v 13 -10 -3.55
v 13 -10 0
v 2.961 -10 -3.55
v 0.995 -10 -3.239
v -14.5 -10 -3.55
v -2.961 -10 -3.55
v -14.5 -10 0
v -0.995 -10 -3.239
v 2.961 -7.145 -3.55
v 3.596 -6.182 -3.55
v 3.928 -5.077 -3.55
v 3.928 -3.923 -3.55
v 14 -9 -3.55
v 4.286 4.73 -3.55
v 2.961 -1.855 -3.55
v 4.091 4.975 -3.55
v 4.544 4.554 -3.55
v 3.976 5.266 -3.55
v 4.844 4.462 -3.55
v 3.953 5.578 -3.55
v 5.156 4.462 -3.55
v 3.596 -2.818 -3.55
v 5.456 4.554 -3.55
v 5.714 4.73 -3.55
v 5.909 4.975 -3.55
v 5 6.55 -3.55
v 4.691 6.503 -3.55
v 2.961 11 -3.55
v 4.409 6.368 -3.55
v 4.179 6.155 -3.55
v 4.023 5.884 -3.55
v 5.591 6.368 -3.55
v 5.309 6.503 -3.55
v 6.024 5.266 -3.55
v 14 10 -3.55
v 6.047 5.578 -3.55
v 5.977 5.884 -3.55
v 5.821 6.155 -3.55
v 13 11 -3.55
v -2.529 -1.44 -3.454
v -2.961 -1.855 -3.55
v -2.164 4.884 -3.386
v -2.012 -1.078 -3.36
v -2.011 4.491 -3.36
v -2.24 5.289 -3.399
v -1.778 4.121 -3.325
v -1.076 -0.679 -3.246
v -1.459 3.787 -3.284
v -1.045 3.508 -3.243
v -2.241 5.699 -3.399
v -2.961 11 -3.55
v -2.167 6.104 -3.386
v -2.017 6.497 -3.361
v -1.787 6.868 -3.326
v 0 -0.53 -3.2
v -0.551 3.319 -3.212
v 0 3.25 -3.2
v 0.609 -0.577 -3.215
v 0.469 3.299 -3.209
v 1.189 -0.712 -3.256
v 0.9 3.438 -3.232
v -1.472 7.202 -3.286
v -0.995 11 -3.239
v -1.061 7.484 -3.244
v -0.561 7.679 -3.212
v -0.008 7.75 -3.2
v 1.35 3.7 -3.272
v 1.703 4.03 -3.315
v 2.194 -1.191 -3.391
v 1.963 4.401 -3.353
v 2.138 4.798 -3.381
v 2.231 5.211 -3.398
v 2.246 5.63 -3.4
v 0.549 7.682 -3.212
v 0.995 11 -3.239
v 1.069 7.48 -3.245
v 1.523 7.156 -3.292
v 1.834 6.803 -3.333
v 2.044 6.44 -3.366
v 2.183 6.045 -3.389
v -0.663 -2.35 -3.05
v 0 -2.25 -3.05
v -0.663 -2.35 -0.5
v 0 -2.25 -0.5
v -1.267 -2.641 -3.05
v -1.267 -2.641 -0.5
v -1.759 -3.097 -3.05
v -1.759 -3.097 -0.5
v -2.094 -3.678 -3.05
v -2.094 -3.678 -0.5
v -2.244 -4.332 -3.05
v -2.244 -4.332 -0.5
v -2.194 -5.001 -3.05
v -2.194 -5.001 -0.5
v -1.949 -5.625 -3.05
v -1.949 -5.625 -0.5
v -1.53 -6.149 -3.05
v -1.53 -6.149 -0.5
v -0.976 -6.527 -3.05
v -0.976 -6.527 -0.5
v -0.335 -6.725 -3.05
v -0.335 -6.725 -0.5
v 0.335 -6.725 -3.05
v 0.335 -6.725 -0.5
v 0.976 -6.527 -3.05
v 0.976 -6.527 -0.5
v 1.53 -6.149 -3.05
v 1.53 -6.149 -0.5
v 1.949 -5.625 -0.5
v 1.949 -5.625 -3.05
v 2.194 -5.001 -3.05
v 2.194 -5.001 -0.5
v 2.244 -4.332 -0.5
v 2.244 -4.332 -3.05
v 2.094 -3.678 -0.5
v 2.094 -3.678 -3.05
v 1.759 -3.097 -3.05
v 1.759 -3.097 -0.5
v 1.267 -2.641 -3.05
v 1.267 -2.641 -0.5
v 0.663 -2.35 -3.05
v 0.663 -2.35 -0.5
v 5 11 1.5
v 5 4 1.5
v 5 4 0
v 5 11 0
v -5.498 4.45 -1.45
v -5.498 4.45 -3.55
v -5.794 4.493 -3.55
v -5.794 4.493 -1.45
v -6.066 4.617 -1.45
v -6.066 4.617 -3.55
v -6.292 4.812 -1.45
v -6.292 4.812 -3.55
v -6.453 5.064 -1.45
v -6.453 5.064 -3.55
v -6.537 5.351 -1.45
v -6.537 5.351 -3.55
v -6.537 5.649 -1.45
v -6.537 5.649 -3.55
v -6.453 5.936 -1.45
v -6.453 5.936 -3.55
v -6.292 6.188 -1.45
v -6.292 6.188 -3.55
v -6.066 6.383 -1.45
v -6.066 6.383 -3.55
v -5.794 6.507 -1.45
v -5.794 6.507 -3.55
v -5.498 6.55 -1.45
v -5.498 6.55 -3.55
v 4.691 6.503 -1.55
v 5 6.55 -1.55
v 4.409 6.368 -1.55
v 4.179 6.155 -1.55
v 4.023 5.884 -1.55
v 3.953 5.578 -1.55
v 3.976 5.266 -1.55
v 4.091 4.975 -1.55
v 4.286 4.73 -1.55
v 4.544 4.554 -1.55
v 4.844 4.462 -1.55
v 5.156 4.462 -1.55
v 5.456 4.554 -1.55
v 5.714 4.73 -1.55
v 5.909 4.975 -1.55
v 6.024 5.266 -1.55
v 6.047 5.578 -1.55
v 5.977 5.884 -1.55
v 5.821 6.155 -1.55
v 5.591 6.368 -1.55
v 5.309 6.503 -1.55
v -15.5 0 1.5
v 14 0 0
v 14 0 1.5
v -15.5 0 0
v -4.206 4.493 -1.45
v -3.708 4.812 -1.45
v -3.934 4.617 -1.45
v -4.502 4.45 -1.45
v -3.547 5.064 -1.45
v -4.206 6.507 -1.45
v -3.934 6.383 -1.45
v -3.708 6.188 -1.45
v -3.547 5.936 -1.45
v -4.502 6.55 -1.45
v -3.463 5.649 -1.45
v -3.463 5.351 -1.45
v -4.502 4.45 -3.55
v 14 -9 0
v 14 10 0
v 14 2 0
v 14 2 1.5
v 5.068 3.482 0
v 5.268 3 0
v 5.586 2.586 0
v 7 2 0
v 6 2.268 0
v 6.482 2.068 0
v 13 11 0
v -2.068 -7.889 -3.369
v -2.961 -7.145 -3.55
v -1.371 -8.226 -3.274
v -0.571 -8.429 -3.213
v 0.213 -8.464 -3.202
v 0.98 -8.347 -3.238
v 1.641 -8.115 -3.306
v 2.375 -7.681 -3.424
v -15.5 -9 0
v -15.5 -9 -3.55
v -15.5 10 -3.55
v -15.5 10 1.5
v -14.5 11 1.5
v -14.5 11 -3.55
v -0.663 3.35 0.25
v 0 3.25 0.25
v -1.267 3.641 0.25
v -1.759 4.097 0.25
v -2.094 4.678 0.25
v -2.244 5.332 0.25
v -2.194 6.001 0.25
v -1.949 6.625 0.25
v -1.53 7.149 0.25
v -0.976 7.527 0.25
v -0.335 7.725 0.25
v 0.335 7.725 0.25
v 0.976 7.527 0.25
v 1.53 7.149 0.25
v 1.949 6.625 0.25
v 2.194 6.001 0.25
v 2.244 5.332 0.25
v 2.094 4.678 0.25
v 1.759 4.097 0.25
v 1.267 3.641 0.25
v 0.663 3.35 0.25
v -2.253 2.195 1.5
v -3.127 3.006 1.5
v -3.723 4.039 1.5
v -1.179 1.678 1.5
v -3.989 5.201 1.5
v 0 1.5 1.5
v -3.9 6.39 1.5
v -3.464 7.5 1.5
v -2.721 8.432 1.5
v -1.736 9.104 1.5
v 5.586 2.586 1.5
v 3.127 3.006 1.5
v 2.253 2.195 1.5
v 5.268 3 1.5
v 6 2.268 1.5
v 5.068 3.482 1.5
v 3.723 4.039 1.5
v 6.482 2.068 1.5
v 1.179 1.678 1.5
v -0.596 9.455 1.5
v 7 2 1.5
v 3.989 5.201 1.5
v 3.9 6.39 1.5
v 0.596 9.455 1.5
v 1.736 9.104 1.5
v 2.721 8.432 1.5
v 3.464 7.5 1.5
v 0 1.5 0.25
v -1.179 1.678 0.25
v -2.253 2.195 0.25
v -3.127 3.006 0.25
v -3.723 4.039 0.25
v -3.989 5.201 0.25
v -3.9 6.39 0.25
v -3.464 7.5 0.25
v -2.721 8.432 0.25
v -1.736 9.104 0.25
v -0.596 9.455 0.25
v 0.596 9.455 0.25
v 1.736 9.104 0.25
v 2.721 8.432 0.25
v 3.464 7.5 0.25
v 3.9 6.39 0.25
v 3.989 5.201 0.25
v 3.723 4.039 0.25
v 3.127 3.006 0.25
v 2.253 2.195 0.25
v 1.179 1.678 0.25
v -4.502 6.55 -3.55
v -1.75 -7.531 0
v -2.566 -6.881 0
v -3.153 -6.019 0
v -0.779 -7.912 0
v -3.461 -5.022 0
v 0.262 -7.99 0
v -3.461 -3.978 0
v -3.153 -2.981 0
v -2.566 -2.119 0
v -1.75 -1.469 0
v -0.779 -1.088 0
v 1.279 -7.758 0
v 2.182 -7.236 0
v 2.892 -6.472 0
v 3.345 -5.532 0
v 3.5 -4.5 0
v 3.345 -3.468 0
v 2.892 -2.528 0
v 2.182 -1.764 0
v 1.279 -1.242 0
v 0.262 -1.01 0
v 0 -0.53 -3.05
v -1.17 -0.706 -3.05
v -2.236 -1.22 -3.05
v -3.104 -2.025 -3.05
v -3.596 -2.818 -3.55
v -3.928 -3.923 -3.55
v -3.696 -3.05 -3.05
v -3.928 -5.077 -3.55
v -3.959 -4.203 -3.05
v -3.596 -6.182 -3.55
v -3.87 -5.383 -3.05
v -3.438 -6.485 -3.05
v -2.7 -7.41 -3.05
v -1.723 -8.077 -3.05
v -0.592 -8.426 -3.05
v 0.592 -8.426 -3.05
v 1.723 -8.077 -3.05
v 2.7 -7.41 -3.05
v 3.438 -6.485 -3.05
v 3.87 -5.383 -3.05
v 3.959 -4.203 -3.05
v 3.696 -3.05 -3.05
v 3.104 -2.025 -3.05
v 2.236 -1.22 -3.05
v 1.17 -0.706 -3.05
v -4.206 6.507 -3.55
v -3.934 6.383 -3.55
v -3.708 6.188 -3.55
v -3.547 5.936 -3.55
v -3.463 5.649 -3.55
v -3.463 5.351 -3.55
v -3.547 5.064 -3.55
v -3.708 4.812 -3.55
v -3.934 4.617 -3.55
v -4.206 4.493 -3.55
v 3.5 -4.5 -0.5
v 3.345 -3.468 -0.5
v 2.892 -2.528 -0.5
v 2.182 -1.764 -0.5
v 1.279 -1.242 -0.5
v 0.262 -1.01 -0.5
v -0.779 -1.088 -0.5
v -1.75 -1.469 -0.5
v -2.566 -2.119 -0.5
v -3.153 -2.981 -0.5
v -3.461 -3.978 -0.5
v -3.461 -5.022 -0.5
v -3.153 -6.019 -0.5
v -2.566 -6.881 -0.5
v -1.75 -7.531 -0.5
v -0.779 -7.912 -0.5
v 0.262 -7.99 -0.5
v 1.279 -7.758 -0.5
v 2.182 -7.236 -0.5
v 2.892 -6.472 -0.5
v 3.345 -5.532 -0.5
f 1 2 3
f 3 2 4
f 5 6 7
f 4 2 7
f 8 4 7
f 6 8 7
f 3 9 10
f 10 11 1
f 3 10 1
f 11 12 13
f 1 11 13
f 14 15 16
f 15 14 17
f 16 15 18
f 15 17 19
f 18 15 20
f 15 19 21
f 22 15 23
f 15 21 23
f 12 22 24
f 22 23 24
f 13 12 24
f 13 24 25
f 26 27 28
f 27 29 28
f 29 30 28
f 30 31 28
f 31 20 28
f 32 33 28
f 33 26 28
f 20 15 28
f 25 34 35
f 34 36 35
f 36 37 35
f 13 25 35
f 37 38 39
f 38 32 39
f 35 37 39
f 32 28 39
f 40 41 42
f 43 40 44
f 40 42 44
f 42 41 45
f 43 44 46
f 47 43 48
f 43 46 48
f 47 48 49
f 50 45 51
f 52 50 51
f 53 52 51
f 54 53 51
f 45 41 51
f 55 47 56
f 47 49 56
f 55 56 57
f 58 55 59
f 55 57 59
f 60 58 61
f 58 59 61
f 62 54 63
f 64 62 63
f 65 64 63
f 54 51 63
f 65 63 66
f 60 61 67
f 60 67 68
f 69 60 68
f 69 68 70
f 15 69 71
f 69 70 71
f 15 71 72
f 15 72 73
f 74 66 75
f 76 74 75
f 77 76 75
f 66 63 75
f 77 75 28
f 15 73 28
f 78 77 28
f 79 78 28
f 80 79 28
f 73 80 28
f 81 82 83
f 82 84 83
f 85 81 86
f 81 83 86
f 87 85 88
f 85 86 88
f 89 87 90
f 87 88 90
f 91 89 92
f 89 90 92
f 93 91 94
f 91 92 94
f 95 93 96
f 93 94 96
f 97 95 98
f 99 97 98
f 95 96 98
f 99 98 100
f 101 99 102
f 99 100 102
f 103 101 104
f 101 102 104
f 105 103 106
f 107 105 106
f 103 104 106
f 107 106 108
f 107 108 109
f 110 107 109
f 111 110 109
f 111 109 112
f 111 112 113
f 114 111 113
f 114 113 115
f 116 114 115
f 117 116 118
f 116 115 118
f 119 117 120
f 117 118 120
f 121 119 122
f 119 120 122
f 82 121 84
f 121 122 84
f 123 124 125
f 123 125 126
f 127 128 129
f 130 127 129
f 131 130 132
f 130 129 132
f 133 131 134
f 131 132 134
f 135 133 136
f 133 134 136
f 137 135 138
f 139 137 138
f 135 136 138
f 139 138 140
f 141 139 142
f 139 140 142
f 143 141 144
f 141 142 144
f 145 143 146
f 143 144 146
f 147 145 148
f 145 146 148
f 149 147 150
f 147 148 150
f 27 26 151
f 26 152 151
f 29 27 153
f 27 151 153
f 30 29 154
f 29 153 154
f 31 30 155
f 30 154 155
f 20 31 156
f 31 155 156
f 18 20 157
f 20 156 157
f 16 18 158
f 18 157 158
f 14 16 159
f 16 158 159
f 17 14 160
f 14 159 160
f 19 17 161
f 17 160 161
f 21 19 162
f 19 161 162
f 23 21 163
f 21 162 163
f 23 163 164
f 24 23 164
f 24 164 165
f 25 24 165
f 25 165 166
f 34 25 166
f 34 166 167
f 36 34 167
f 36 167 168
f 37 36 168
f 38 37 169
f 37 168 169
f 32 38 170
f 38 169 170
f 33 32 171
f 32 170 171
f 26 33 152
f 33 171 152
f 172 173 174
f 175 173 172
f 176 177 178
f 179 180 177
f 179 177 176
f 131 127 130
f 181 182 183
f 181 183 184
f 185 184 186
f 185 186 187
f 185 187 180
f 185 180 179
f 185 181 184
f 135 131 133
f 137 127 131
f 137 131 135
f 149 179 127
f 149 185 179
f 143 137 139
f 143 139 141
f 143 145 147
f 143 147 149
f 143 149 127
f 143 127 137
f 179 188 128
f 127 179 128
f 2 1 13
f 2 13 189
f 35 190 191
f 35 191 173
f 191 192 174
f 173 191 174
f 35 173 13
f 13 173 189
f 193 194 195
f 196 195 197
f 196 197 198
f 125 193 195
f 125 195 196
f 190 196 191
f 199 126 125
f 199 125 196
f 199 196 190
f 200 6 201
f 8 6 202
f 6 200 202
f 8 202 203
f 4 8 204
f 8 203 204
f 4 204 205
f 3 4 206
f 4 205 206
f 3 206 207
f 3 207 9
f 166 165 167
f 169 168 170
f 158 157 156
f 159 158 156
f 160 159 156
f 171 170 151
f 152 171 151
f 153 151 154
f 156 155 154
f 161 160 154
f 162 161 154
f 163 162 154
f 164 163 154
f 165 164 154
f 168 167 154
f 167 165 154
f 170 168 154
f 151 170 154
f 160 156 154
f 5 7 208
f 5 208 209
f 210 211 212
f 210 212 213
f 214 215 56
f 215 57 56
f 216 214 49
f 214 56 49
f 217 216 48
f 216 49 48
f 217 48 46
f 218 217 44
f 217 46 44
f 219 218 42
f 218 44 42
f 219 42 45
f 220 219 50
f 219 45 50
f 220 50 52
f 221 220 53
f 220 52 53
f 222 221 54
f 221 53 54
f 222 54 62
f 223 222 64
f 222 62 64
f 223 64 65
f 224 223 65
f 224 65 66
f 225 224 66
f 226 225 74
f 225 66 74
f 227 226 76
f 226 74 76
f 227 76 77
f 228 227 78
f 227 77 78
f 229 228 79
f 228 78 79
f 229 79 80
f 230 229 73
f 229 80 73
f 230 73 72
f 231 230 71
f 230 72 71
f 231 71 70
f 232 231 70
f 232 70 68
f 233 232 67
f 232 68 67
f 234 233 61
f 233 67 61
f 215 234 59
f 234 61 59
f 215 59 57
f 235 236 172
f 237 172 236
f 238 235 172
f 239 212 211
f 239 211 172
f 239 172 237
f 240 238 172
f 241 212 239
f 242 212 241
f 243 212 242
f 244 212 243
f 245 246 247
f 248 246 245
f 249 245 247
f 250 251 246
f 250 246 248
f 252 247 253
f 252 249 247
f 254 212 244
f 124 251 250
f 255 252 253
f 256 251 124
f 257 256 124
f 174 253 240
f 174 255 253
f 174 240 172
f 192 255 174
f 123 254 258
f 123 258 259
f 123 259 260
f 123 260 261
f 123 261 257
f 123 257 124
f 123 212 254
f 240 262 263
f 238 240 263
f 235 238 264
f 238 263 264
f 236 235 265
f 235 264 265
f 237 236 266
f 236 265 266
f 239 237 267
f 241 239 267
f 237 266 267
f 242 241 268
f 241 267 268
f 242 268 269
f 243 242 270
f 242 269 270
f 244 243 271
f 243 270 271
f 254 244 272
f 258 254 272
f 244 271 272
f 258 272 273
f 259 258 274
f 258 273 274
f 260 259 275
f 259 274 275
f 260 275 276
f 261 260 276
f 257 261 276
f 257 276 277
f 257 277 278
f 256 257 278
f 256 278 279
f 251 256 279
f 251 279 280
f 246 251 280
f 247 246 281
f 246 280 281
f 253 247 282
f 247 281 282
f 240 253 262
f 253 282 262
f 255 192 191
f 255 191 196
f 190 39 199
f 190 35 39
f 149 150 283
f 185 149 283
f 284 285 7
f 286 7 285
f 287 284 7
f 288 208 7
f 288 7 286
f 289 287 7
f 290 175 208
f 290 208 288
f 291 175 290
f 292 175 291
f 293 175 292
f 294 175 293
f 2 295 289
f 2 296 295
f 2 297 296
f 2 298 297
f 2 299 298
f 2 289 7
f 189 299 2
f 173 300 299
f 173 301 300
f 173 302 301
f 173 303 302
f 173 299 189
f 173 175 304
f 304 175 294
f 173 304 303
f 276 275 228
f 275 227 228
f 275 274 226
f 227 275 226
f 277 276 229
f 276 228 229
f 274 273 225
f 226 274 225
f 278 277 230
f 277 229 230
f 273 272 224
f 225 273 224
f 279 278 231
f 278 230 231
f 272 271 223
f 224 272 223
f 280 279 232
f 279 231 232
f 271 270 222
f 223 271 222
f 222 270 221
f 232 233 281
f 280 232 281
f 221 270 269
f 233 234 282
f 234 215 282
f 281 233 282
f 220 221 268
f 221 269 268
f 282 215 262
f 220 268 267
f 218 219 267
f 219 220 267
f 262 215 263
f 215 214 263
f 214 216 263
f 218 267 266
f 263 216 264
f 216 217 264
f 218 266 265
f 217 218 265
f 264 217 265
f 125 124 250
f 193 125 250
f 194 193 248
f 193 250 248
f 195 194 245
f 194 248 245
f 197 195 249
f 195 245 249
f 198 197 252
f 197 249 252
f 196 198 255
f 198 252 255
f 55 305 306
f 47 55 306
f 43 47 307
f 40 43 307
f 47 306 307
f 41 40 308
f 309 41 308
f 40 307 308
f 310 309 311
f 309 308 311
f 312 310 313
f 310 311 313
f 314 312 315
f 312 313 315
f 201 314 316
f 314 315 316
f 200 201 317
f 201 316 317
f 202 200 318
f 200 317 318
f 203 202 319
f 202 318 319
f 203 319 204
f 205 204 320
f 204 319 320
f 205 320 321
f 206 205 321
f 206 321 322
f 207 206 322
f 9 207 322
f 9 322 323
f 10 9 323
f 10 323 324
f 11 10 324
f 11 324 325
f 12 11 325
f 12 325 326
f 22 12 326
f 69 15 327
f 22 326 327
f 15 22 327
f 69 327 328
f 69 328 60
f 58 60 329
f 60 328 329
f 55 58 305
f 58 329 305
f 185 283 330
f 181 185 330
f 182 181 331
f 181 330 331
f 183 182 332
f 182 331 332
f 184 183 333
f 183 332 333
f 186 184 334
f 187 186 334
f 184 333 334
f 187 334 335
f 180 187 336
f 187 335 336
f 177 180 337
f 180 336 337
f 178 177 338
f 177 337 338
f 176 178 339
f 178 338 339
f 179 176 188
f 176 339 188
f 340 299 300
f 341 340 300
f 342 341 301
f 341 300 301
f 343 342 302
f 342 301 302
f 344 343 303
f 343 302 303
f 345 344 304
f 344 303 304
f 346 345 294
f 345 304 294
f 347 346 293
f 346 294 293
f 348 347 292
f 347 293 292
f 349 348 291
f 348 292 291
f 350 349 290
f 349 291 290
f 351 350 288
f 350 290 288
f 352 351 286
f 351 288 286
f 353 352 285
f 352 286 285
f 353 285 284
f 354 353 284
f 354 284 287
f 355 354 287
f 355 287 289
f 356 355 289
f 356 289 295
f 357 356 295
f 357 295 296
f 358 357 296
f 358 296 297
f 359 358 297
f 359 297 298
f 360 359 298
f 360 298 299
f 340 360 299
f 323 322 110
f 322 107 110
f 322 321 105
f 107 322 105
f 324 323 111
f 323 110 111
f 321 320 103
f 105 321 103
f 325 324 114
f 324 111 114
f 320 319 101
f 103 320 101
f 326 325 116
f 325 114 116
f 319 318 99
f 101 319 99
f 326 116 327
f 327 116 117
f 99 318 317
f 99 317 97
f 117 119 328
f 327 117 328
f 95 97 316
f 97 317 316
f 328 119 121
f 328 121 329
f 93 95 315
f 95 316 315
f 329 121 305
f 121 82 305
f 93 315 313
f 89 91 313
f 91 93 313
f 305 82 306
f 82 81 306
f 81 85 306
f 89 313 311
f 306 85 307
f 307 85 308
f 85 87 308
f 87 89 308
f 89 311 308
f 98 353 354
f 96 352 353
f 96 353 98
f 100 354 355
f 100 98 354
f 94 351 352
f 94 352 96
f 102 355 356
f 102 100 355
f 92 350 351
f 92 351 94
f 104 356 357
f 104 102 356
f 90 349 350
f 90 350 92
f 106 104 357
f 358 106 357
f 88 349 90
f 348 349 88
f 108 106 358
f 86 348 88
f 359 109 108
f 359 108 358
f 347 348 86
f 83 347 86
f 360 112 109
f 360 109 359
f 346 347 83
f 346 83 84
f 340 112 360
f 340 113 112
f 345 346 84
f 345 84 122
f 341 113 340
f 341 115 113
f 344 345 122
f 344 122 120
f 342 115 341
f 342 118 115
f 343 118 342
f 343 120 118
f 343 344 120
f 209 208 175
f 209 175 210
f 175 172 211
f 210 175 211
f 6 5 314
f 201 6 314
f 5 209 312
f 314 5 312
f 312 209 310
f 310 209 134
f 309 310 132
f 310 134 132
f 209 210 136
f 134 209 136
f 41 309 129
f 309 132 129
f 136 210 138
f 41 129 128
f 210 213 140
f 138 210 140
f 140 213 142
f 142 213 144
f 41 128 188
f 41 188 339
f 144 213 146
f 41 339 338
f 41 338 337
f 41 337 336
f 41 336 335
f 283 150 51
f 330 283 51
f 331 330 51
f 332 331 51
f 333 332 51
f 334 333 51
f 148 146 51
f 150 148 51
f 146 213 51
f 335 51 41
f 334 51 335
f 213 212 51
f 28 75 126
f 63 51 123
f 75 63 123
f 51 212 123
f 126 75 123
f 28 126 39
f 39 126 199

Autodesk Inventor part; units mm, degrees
ref_plane "YZ Plane" through (0, 0, 0) normal (1, 0, 0) x (0, 1, 0)
ref_plane "XZ Plane" through (0, 0, 0) normal (0, 1, 0) x (-1, 0, 0)
ref_plane "XY Plane" through (0, 0, 0) normal (0, 0, 1) x (1, 0, 0)
sketch "Sketch1" plane through (0, 0, 0) normal (0, 0, 1) x (1, 0, 0)
  line L0 (-15.5, 11) -> (14, 11)
  line L1 (14, 11) -> (14, -10)
  line L2 (14, -10) -> (-15.5, -10)
  line L3 (-15.5, -10) -> (-15.5, 11)
  point P0 (0, 0)
  dimension "d0" = 29.5
  dimension "d1" = 21
  dimension "d2" = 10
  dimension "d3" = 14
extrude "Extrusion1" add sketch "Sketch1" against normal blind 3.55
sketch "Sketch2" plane through (0, 0, 0) normal (0, 0, 1) x (1, 0, 0)
  line L0 (-15.5, 11) -> (14, 11)
  line L1 (14, 11) -> (14, 0)
  line L2 (14, 0) -> (-15.5, 0)
  line L3 (-15.5, 0) -> (-15.5, 11)
  line L4 (14, 11) -> (-15.5, 11) projected
  point P0 (0, 0)
  dimension "d6" = 29.5
  dimension "d8" = 0
  dimension "d27" = 0
  dimension "d77" = 14
extrude "Extrusion2" add sketch "Sketch2" along normal blind 1.5
sketch "Sketch3" plane through (0, 0, 1.5) normal (0, 0, 1) x (1, 0, 0)
  line L0 (-15.5, 0) -> (14, 0) projected
  line L1 (14, 11) -> (-15.5, 11) projected
  point P0 (0, 0)
  point P1 (0, 5.5)
  dimension "d12" = 0
  dimension "d28" = 11
  dimension "d29" = 5.5
sketch "Sketch5" plane through (0, 0, -3.55) normal (0, 0, -1) x (-1, 0, 0)
  line L0 (15.5, -10) -> (15.5, 11) projected
  line L1 (-14, 0) -> (15.5, 0) projected
  line L2 (-14, -10) -> (15.5, -10) projected
  line L3 (-14, -10) -> (-14, 0) projected
  point P0 (0, 0)
  point P1 (0, -4.5)
  dimension "d19" = 4.5
  dimension "d78" = 14
hole "Hole1" at (0, -4.5, -3.55) direction (0, 0, 1) diameter 4.5 end through all counterbore diameter 7.94 counterbore depth 0.5 clearance for "Socket Head Cap Screw" size "#8" standard "Ansi Unified Screw Threads"
hole "Hole2" at (0, 5.5, 1.5) direction (0, 0, -1) diameter 4.5 end through all counterbore diameter 8 counterbore depth 1.25 clearance for "Socket Head Cap Screw" size "#8" standard "Ansi Unified Screw Threads"
sketch "Sketch6" plane through (0, 0, -3.55) normal (0, 0, -1) x (-1, 0, 0)
  line L0 (5.498, 5.5) -> (4.502, 5.5) construction
  line L1 (5.498, 6.55) -> (4.502, 6.55)
  line L2 (4.502, 4.45) -> (5.498, 4.45)
  arc A0 (5.498, 4.45) -> (5.498, 6.55) centre (5.498, 5.5) ccw
  arc A1 (4.502, 6.55) -> (4.502, 4.45) centre (4.502, 5.5) ccw
  point P0 (0, 0)
  point P1 (0, 5.5)
  point P2 (-5, 5.5)
  point P3 (5, 5.5)
  dimension "d37" = 0
  dimension "d38" = 5.5
  dimension "d39" = 0
  dimension "d40" = 5
  dimension "d41" = 0
  dimension "d42" = 5
  dimension "d58" = 1.05
  dimension "d60" = 0.996
hole "Hole3" at (5, 5.5, -3.55) direction (0, 0, 1) diameter 2.1 depth 2
sketch "Sketch8" plane through (0, 0, 0) normal (0, 0, 1) x (1, 0, 0)
  circle A0 centre (0, -4.5) radius 3.5
  circle A1 centre (0, -4.5) radius 2.25 projected
  point P0 (0, 0)
  dimension "d53" = 0
  dimension "d54" = 0
  dimension "d55" = 7
extrude "Extrusion3" cut sketch "Sketch8" against normal blind 0.5
extrude "Extrusion4" cut sketch "Sketch6" against normal blind 2.1
chamfer "Chamfer3" distance 1 angle 45 4 edges at (14, 11, -1.025) (-15.5, 11, -1.025) (14, -10, -1.775) (-15.5, -10, -1.775)
sketch "Sketch9" plane through (-14.5, 11, 1.5) normal (0, 1, 0) x (1, 0, 0)
  circle A0 centre (14.5, 17.4) radius 12.7
  line L0 (27.5, 0) -> (0, 0) projected
  point P0 (14.5, 1.5)
  point P1 (30, 0)
  point P2 (0.5, 0)
  dimension "d72" = 0
  dimension "d73" = 25.4
  dimension "d74" = 17.4
extrude "Extrusion5" cut sketch "Sketch9" against normal up to surface (21 mm away)
sketch "Sketch10" plane through (-14.5, 11, 1.5) normal (0, 1, 0) x (1, 0, 0)
  circle A0 centre (23.017, -3.75) radius 5.25
  line L0 (27.5, 0) -> (0, 0) projected
  point P0 (14.5, 1.5)
  point P1 (19.3428, 0)
  point P2 (26.6912, 0)
  dimension "d79" = 10.5
  dimension "d82" = 3.75
  dimension "d83" = 8.517
extrude "Extrusion6" [suppressed]
sketch "Sketch11" plane through (0, 0, 1.5) normal (0, 0, 1) x (1, 0, 0)
  line L0 (5, 11) -> (14, 11)
  line L1 (14, 11) -> (14, 2)
  line L2 (14, 2) -> (7, 2)
  line L3 (5, 4) -> (5, 11)
  line L4 (13, 11) -> (-14.5, 11) projected
  line L5 (14, 0) -> (14, 10) projected
  line L6 (-15.5, 0) -> (14, 0) projected
  arc A0 (5, 4) -> (7, 2) centre (7, 4) ccw
  point P0 (0, 0)
  point P1 (5, 2)
  point P2 (4.8428, 11)
  point P3 (12.1912, 0)
  dimension "d86" = 0
  dimension "d87" = 0
  dimension "d88" = 9
  dimension "d89" = 2
  dimension "d94" = 2
extrude "Extrusion7" cut sketch "Sketch11" against normal blind 1.5
equation "\"d6\" = d0"
equation "\"d77\" = d3"
equation "\"d29\" = 0.5 * d28"
equation "\"d78\" = d3"
equation "\"d40\" = d42"
properties part number "rd-mount"
